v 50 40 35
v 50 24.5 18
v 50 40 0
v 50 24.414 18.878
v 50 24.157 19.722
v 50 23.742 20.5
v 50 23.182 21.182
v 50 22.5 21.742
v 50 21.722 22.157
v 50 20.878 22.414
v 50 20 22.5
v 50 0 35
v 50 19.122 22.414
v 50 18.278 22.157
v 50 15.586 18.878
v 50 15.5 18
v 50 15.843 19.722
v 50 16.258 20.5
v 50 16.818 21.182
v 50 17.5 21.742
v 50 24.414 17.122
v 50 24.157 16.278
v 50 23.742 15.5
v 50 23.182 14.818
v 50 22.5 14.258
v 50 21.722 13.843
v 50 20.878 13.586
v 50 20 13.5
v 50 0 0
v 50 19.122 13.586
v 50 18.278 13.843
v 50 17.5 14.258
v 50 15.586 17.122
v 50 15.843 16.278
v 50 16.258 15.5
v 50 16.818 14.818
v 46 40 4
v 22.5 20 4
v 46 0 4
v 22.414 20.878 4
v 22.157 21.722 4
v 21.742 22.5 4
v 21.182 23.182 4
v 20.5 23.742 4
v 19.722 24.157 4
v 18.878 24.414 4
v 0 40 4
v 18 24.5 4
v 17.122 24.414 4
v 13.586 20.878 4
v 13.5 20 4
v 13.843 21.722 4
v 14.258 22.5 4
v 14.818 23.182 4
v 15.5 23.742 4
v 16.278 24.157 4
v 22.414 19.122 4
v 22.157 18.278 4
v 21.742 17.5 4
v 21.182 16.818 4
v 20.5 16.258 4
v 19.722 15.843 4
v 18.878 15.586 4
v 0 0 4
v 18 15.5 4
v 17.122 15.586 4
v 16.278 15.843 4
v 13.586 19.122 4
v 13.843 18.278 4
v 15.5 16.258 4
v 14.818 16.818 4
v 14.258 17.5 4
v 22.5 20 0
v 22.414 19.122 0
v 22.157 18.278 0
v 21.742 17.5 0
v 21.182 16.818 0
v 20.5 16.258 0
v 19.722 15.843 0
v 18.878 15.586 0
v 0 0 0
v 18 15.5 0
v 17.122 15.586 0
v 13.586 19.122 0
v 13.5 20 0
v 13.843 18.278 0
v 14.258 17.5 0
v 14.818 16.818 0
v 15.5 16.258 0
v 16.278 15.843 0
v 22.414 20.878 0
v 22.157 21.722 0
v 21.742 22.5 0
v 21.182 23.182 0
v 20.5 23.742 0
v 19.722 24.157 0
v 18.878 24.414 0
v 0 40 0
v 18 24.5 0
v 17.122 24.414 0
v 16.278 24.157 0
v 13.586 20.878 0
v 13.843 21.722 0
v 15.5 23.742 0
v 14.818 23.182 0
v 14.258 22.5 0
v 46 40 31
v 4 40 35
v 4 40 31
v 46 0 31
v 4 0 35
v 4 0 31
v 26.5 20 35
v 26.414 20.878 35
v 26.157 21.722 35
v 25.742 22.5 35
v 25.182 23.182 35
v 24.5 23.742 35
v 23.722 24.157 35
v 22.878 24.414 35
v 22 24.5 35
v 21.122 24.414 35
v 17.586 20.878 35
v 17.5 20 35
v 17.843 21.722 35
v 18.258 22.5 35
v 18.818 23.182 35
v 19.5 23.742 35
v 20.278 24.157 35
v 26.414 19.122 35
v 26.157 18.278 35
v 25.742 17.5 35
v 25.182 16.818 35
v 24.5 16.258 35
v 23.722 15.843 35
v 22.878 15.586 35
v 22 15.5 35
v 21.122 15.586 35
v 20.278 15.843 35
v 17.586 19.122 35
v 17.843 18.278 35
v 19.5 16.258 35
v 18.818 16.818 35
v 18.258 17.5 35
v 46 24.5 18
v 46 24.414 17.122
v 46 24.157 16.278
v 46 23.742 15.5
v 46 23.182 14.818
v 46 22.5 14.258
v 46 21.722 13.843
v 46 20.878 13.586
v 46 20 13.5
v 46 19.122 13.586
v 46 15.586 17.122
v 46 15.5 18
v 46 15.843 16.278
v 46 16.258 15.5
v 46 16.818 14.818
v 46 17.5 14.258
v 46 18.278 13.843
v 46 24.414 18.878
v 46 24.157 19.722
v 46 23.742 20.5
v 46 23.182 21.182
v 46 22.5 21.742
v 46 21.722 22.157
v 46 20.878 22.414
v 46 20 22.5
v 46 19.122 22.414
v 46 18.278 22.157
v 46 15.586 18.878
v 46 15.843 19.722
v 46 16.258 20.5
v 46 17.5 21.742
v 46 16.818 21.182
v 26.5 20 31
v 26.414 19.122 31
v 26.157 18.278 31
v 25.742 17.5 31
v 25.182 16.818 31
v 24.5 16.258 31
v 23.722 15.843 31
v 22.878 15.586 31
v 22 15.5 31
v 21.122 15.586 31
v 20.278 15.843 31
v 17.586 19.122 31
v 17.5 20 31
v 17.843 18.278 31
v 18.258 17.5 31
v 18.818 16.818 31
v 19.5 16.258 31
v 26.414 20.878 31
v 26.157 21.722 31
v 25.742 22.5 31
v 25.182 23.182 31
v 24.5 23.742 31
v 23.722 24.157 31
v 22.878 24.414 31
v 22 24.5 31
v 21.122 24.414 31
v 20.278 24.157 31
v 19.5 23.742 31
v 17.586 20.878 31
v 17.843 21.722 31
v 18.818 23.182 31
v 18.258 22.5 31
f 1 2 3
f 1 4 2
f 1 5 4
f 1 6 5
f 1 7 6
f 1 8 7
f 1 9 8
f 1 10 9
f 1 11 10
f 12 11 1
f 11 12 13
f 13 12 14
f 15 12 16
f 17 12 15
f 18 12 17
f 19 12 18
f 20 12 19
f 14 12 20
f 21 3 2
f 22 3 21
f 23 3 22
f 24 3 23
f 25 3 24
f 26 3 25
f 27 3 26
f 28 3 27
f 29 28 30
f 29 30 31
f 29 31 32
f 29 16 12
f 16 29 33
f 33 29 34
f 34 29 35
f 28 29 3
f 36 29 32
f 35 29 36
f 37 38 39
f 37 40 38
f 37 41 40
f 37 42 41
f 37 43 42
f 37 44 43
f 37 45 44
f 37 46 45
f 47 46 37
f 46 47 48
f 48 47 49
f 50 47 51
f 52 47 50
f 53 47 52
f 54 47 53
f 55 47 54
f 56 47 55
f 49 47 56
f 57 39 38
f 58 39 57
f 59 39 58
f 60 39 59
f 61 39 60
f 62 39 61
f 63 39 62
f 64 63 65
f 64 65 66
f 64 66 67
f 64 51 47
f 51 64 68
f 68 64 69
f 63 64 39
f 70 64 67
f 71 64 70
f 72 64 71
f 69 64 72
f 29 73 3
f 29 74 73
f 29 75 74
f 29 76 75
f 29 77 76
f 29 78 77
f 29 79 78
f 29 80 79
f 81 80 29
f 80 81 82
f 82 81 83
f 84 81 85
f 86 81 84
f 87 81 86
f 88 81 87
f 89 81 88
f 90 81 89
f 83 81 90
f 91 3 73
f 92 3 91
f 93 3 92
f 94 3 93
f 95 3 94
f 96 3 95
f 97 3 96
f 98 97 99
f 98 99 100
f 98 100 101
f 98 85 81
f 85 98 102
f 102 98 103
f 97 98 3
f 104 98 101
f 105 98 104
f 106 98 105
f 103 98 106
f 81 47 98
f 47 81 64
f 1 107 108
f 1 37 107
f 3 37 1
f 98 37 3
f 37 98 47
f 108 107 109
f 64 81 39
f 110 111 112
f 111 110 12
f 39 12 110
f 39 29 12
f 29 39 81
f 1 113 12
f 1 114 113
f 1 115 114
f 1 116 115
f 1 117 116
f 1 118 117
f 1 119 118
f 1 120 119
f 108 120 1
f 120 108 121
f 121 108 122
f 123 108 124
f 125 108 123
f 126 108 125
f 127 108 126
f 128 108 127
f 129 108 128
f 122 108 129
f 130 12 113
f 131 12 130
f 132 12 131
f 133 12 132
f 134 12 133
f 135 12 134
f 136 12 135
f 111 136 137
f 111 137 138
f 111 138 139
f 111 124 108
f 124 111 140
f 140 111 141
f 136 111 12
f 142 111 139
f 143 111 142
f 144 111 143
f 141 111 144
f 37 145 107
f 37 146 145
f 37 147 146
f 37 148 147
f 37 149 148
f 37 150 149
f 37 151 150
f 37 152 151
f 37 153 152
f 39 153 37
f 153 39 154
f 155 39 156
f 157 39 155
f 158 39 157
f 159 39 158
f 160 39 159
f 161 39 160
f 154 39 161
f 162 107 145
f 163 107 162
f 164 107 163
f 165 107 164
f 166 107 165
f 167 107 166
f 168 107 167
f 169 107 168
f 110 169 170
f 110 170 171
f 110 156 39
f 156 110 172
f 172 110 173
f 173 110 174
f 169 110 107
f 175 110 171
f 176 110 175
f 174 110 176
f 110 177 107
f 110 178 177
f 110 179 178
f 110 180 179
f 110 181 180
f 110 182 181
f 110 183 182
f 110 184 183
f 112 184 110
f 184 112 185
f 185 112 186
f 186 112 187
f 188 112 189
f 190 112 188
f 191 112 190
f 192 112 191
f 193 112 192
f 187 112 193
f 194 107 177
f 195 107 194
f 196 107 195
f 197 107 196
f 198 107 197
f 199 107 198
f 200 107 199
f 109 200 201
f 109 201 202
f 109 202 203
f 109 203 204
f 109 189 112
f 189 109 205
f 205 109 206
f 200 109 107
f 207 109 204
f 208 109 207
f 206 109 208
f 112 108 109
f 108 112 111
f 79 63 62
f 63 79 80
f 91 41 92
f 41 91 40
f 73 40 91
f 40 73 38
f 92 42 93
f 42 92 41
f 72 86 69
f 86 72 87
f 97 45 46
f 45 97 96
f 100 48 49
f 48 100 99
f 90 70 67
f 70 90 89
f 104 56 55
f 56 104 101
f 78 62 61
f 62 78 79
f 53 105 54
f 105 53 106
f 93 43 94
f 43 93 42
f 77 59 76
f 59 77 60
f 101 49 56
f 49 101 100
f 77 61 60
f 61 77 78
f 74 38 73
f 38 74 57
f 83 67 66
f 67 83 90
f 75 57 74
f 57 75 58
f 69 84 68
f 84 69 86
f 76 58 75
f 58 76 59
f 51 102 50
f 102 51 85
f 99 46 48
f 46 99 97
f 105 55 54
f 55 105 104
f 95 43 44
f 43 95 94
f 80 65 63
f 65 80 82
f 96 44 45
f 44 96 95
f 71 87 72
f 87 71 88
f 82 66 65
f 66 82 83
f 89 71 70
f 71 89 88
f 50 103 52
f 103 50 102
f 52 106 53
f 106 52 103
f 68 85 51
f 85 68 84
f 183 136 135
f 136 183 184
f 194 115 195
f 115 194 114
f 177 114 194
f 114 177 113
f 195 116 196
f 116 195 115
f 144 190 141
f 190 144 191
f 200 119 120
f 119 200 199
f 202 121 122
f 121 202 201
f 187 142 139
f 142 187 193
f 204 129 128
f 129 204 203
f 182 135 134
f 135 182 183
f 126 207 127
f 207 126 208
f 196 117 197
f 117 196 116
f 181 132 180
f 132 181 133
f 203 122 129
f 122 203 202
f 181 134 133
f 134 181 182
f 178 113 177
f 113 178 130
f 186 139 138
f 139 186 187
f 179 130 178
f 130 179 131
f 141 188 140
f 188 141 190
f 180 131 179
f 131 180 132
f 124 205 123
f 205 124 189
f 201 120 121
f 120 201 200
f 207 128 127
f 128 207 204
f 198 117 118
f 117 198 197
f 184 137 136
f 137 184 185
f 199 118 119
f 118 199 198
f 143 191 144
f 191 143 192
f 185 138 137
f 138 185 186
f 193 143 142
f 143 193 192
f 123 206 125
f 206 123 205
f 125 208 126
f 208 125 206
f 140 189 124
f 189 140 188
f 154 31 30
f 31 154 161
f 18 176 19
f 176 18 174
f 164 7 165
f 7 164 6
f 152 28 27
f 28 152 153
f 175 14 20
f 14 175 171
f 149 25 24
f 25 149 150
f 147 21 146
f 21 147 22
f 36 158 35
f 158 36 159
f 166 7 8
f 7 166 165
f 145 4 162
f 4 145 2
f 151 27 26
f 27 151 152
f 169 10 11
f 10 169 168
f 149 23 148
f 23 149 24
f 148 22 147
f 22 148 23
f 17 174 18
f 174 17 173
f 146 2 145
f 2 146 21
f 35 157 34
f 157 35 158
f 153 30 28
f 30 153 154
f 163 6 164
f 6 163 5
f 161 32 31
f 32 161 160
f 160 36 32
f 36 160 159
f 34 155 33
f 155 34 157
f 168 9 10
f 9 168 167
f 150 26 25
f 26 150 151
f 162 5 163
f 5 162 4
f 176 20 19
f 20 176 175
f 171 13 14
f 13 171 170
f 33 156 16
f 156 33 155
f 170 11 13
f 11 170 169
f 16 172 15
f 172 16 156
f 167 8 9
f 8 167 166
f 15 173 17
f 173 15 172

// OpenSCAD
$fn = 32;

// ----------------------------------------------------------------------
// Z-bracket: 50 x 40 x 35 mm
// ----------------------------------------------------------------------

// --- parameters (mm) ---
lower_leg = 50;           // lower foot length, X
upper_leg = 42;           // upper foot length, X
bracket_w = 40;           // bracket width, Y
offset_h = 35;            // overall rise, Z
sheet_t = 4;              // plate thickness
hole_d = 9;               // clearance for M8

module hole_z(px, py, z0) {
  translate([px, py, z0 - 0.5]) cylinder(h = sheet_t + 1, d = hole_d);
}
module hole_x(py, pz) {
  translate([-0.5, py, pz]) rotate([0, 90, 0]) cylinder(h = sheet_t + 1, d = hole_d);
}

difference() {
  union() {
    cube([lower_leg, bracket_w, sheet_t]);
    /* web, overlapping the lower foot */
    translate([lower_leg - sheet_t, 0, 0]) cube([sheet_t, bracket_w, offset_h]);
    /* upper foot, sunk into the web */
    translate([lower_leg - sheet_t - upper_leg, 0, offset_h - sheet_t]) cube([upper_leg + sheet_t, bracket_w, sheet_t]);
  }
  hole_z(18, 20, 0);
  translate([lower_leg - sheet_t - 24, 0, 0]) hole_z(0, 20, offset_h - sheet_t);
  translate([lower_leg - sheet_t, 0, 0]) hole_x(20, 18);
}
